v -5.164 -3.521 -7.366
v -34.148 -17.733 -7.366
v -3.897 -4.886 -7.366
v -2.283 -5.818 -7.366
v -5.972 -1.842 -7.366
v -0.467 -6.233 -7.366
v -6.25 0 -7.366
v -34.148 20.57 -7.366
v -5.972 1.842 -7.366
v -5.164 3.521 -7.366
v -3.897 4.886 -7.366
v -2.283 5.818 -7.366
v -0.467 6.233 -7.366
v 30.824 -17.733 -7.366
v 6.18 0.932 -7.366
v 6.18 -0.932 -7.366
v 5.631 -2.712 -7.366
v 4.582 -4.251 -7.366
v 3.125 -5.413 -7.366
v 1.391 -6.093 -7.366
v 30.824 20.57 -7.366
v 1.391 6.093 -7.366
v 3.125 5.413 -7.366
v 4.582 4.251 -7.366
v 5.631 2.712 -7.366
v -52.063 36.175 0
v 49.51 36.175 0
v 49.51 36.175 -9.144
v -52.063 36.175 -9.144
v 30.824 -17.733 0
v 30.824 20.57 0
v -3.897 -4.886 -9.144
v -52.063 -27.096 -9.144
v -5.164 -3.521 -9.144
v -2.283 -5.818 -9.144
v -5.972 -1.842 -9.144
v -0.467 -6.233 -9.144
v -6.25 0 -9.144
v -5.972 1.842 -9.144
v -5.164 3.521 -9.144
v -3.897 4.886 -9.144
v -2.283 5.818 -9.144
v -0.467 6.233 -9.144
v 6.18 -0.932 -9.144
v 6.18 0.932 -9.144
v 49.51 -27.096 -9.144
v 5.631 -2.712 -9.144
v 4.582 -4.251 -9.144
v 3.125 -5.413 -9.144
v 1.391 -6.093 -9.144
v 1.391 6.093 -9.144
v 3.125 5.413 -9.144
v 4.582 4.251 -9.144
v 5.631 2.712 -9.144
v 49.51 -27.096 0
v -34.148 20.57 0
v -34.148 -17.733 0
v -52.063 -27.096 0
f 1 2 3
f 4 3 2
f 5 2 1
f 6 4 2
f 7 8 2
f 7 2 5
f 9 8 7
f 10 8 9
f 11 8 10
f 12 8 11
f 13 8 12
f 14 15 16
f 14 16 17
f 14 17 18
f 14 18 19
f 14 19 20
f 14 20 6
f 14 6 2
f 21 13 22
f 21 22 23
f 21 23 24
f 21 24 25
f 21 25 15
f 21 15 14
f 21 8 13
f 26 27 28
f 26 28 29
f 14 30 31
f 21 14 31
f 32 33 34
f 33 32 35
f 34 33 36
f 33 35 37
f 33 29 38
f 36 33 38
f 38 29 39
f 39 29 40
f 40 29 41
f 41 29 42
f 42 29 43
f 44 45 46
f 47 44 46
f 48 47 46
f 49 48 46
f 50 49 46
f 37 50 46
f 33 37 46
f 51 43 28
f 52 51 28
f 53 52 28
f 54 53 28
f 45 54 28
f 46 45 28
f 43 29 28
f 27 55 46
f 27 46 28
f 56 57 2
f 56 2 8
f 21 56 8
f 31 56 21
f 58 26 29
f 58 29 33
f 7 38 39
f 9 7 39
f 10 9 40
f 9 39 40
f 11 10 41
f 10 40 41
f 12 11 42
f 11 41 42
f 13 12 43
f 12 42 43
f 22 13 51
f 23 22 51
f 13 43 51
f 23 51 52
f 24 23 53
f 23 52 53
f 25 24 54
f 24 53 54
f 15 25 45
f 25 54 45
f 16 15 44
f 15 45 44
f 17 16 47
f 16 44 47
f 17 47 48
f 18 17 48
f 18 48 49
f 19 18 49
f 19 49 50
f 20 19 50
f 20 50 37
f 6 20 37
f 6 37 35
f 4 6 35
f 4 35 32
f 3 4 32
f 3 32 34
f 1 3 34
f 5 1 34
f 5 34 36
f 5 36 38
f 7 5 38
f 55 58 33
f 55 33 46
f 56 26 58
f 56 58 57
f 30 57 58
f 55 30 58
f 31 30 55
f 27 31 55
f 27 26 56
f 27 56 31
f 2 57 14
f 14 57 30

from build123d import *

# Parameters (mm, degrees)
F1_DEPTH = 9.144
F2_W     = 64.972662
F2_H     = 38.302661
F3_DEPTH = 7.366
F5_D     = 12.5


with BuildPart() as f1:
    # F0 (on Top) → F1 (new body)
    with BuildSketch(Plane.XY):
        Polygon((49.50973, 36.174733), (0, 36.174733), (-52.063245, 36.174733), (-52.063245, -27.095586), (49.50973, -27.095586), align=None)
    extrude(amount=-F1_DEPTH)

    # F2 (on Top) → F3 (cut)
    with BuildSketch(Plane.XY):
        with Locations((-1.661934, 1.418617)):
            Rectangle(F2_W, F2_H)
    extrude(amount=-F3_DEPTH, mode=Mode.SUBTRACT)

    # F5 (through all)
    with Locations(Plane.XY):
        with Locations((0, 0)):
            Hole(F5_D / 2)


solid = f1.part
